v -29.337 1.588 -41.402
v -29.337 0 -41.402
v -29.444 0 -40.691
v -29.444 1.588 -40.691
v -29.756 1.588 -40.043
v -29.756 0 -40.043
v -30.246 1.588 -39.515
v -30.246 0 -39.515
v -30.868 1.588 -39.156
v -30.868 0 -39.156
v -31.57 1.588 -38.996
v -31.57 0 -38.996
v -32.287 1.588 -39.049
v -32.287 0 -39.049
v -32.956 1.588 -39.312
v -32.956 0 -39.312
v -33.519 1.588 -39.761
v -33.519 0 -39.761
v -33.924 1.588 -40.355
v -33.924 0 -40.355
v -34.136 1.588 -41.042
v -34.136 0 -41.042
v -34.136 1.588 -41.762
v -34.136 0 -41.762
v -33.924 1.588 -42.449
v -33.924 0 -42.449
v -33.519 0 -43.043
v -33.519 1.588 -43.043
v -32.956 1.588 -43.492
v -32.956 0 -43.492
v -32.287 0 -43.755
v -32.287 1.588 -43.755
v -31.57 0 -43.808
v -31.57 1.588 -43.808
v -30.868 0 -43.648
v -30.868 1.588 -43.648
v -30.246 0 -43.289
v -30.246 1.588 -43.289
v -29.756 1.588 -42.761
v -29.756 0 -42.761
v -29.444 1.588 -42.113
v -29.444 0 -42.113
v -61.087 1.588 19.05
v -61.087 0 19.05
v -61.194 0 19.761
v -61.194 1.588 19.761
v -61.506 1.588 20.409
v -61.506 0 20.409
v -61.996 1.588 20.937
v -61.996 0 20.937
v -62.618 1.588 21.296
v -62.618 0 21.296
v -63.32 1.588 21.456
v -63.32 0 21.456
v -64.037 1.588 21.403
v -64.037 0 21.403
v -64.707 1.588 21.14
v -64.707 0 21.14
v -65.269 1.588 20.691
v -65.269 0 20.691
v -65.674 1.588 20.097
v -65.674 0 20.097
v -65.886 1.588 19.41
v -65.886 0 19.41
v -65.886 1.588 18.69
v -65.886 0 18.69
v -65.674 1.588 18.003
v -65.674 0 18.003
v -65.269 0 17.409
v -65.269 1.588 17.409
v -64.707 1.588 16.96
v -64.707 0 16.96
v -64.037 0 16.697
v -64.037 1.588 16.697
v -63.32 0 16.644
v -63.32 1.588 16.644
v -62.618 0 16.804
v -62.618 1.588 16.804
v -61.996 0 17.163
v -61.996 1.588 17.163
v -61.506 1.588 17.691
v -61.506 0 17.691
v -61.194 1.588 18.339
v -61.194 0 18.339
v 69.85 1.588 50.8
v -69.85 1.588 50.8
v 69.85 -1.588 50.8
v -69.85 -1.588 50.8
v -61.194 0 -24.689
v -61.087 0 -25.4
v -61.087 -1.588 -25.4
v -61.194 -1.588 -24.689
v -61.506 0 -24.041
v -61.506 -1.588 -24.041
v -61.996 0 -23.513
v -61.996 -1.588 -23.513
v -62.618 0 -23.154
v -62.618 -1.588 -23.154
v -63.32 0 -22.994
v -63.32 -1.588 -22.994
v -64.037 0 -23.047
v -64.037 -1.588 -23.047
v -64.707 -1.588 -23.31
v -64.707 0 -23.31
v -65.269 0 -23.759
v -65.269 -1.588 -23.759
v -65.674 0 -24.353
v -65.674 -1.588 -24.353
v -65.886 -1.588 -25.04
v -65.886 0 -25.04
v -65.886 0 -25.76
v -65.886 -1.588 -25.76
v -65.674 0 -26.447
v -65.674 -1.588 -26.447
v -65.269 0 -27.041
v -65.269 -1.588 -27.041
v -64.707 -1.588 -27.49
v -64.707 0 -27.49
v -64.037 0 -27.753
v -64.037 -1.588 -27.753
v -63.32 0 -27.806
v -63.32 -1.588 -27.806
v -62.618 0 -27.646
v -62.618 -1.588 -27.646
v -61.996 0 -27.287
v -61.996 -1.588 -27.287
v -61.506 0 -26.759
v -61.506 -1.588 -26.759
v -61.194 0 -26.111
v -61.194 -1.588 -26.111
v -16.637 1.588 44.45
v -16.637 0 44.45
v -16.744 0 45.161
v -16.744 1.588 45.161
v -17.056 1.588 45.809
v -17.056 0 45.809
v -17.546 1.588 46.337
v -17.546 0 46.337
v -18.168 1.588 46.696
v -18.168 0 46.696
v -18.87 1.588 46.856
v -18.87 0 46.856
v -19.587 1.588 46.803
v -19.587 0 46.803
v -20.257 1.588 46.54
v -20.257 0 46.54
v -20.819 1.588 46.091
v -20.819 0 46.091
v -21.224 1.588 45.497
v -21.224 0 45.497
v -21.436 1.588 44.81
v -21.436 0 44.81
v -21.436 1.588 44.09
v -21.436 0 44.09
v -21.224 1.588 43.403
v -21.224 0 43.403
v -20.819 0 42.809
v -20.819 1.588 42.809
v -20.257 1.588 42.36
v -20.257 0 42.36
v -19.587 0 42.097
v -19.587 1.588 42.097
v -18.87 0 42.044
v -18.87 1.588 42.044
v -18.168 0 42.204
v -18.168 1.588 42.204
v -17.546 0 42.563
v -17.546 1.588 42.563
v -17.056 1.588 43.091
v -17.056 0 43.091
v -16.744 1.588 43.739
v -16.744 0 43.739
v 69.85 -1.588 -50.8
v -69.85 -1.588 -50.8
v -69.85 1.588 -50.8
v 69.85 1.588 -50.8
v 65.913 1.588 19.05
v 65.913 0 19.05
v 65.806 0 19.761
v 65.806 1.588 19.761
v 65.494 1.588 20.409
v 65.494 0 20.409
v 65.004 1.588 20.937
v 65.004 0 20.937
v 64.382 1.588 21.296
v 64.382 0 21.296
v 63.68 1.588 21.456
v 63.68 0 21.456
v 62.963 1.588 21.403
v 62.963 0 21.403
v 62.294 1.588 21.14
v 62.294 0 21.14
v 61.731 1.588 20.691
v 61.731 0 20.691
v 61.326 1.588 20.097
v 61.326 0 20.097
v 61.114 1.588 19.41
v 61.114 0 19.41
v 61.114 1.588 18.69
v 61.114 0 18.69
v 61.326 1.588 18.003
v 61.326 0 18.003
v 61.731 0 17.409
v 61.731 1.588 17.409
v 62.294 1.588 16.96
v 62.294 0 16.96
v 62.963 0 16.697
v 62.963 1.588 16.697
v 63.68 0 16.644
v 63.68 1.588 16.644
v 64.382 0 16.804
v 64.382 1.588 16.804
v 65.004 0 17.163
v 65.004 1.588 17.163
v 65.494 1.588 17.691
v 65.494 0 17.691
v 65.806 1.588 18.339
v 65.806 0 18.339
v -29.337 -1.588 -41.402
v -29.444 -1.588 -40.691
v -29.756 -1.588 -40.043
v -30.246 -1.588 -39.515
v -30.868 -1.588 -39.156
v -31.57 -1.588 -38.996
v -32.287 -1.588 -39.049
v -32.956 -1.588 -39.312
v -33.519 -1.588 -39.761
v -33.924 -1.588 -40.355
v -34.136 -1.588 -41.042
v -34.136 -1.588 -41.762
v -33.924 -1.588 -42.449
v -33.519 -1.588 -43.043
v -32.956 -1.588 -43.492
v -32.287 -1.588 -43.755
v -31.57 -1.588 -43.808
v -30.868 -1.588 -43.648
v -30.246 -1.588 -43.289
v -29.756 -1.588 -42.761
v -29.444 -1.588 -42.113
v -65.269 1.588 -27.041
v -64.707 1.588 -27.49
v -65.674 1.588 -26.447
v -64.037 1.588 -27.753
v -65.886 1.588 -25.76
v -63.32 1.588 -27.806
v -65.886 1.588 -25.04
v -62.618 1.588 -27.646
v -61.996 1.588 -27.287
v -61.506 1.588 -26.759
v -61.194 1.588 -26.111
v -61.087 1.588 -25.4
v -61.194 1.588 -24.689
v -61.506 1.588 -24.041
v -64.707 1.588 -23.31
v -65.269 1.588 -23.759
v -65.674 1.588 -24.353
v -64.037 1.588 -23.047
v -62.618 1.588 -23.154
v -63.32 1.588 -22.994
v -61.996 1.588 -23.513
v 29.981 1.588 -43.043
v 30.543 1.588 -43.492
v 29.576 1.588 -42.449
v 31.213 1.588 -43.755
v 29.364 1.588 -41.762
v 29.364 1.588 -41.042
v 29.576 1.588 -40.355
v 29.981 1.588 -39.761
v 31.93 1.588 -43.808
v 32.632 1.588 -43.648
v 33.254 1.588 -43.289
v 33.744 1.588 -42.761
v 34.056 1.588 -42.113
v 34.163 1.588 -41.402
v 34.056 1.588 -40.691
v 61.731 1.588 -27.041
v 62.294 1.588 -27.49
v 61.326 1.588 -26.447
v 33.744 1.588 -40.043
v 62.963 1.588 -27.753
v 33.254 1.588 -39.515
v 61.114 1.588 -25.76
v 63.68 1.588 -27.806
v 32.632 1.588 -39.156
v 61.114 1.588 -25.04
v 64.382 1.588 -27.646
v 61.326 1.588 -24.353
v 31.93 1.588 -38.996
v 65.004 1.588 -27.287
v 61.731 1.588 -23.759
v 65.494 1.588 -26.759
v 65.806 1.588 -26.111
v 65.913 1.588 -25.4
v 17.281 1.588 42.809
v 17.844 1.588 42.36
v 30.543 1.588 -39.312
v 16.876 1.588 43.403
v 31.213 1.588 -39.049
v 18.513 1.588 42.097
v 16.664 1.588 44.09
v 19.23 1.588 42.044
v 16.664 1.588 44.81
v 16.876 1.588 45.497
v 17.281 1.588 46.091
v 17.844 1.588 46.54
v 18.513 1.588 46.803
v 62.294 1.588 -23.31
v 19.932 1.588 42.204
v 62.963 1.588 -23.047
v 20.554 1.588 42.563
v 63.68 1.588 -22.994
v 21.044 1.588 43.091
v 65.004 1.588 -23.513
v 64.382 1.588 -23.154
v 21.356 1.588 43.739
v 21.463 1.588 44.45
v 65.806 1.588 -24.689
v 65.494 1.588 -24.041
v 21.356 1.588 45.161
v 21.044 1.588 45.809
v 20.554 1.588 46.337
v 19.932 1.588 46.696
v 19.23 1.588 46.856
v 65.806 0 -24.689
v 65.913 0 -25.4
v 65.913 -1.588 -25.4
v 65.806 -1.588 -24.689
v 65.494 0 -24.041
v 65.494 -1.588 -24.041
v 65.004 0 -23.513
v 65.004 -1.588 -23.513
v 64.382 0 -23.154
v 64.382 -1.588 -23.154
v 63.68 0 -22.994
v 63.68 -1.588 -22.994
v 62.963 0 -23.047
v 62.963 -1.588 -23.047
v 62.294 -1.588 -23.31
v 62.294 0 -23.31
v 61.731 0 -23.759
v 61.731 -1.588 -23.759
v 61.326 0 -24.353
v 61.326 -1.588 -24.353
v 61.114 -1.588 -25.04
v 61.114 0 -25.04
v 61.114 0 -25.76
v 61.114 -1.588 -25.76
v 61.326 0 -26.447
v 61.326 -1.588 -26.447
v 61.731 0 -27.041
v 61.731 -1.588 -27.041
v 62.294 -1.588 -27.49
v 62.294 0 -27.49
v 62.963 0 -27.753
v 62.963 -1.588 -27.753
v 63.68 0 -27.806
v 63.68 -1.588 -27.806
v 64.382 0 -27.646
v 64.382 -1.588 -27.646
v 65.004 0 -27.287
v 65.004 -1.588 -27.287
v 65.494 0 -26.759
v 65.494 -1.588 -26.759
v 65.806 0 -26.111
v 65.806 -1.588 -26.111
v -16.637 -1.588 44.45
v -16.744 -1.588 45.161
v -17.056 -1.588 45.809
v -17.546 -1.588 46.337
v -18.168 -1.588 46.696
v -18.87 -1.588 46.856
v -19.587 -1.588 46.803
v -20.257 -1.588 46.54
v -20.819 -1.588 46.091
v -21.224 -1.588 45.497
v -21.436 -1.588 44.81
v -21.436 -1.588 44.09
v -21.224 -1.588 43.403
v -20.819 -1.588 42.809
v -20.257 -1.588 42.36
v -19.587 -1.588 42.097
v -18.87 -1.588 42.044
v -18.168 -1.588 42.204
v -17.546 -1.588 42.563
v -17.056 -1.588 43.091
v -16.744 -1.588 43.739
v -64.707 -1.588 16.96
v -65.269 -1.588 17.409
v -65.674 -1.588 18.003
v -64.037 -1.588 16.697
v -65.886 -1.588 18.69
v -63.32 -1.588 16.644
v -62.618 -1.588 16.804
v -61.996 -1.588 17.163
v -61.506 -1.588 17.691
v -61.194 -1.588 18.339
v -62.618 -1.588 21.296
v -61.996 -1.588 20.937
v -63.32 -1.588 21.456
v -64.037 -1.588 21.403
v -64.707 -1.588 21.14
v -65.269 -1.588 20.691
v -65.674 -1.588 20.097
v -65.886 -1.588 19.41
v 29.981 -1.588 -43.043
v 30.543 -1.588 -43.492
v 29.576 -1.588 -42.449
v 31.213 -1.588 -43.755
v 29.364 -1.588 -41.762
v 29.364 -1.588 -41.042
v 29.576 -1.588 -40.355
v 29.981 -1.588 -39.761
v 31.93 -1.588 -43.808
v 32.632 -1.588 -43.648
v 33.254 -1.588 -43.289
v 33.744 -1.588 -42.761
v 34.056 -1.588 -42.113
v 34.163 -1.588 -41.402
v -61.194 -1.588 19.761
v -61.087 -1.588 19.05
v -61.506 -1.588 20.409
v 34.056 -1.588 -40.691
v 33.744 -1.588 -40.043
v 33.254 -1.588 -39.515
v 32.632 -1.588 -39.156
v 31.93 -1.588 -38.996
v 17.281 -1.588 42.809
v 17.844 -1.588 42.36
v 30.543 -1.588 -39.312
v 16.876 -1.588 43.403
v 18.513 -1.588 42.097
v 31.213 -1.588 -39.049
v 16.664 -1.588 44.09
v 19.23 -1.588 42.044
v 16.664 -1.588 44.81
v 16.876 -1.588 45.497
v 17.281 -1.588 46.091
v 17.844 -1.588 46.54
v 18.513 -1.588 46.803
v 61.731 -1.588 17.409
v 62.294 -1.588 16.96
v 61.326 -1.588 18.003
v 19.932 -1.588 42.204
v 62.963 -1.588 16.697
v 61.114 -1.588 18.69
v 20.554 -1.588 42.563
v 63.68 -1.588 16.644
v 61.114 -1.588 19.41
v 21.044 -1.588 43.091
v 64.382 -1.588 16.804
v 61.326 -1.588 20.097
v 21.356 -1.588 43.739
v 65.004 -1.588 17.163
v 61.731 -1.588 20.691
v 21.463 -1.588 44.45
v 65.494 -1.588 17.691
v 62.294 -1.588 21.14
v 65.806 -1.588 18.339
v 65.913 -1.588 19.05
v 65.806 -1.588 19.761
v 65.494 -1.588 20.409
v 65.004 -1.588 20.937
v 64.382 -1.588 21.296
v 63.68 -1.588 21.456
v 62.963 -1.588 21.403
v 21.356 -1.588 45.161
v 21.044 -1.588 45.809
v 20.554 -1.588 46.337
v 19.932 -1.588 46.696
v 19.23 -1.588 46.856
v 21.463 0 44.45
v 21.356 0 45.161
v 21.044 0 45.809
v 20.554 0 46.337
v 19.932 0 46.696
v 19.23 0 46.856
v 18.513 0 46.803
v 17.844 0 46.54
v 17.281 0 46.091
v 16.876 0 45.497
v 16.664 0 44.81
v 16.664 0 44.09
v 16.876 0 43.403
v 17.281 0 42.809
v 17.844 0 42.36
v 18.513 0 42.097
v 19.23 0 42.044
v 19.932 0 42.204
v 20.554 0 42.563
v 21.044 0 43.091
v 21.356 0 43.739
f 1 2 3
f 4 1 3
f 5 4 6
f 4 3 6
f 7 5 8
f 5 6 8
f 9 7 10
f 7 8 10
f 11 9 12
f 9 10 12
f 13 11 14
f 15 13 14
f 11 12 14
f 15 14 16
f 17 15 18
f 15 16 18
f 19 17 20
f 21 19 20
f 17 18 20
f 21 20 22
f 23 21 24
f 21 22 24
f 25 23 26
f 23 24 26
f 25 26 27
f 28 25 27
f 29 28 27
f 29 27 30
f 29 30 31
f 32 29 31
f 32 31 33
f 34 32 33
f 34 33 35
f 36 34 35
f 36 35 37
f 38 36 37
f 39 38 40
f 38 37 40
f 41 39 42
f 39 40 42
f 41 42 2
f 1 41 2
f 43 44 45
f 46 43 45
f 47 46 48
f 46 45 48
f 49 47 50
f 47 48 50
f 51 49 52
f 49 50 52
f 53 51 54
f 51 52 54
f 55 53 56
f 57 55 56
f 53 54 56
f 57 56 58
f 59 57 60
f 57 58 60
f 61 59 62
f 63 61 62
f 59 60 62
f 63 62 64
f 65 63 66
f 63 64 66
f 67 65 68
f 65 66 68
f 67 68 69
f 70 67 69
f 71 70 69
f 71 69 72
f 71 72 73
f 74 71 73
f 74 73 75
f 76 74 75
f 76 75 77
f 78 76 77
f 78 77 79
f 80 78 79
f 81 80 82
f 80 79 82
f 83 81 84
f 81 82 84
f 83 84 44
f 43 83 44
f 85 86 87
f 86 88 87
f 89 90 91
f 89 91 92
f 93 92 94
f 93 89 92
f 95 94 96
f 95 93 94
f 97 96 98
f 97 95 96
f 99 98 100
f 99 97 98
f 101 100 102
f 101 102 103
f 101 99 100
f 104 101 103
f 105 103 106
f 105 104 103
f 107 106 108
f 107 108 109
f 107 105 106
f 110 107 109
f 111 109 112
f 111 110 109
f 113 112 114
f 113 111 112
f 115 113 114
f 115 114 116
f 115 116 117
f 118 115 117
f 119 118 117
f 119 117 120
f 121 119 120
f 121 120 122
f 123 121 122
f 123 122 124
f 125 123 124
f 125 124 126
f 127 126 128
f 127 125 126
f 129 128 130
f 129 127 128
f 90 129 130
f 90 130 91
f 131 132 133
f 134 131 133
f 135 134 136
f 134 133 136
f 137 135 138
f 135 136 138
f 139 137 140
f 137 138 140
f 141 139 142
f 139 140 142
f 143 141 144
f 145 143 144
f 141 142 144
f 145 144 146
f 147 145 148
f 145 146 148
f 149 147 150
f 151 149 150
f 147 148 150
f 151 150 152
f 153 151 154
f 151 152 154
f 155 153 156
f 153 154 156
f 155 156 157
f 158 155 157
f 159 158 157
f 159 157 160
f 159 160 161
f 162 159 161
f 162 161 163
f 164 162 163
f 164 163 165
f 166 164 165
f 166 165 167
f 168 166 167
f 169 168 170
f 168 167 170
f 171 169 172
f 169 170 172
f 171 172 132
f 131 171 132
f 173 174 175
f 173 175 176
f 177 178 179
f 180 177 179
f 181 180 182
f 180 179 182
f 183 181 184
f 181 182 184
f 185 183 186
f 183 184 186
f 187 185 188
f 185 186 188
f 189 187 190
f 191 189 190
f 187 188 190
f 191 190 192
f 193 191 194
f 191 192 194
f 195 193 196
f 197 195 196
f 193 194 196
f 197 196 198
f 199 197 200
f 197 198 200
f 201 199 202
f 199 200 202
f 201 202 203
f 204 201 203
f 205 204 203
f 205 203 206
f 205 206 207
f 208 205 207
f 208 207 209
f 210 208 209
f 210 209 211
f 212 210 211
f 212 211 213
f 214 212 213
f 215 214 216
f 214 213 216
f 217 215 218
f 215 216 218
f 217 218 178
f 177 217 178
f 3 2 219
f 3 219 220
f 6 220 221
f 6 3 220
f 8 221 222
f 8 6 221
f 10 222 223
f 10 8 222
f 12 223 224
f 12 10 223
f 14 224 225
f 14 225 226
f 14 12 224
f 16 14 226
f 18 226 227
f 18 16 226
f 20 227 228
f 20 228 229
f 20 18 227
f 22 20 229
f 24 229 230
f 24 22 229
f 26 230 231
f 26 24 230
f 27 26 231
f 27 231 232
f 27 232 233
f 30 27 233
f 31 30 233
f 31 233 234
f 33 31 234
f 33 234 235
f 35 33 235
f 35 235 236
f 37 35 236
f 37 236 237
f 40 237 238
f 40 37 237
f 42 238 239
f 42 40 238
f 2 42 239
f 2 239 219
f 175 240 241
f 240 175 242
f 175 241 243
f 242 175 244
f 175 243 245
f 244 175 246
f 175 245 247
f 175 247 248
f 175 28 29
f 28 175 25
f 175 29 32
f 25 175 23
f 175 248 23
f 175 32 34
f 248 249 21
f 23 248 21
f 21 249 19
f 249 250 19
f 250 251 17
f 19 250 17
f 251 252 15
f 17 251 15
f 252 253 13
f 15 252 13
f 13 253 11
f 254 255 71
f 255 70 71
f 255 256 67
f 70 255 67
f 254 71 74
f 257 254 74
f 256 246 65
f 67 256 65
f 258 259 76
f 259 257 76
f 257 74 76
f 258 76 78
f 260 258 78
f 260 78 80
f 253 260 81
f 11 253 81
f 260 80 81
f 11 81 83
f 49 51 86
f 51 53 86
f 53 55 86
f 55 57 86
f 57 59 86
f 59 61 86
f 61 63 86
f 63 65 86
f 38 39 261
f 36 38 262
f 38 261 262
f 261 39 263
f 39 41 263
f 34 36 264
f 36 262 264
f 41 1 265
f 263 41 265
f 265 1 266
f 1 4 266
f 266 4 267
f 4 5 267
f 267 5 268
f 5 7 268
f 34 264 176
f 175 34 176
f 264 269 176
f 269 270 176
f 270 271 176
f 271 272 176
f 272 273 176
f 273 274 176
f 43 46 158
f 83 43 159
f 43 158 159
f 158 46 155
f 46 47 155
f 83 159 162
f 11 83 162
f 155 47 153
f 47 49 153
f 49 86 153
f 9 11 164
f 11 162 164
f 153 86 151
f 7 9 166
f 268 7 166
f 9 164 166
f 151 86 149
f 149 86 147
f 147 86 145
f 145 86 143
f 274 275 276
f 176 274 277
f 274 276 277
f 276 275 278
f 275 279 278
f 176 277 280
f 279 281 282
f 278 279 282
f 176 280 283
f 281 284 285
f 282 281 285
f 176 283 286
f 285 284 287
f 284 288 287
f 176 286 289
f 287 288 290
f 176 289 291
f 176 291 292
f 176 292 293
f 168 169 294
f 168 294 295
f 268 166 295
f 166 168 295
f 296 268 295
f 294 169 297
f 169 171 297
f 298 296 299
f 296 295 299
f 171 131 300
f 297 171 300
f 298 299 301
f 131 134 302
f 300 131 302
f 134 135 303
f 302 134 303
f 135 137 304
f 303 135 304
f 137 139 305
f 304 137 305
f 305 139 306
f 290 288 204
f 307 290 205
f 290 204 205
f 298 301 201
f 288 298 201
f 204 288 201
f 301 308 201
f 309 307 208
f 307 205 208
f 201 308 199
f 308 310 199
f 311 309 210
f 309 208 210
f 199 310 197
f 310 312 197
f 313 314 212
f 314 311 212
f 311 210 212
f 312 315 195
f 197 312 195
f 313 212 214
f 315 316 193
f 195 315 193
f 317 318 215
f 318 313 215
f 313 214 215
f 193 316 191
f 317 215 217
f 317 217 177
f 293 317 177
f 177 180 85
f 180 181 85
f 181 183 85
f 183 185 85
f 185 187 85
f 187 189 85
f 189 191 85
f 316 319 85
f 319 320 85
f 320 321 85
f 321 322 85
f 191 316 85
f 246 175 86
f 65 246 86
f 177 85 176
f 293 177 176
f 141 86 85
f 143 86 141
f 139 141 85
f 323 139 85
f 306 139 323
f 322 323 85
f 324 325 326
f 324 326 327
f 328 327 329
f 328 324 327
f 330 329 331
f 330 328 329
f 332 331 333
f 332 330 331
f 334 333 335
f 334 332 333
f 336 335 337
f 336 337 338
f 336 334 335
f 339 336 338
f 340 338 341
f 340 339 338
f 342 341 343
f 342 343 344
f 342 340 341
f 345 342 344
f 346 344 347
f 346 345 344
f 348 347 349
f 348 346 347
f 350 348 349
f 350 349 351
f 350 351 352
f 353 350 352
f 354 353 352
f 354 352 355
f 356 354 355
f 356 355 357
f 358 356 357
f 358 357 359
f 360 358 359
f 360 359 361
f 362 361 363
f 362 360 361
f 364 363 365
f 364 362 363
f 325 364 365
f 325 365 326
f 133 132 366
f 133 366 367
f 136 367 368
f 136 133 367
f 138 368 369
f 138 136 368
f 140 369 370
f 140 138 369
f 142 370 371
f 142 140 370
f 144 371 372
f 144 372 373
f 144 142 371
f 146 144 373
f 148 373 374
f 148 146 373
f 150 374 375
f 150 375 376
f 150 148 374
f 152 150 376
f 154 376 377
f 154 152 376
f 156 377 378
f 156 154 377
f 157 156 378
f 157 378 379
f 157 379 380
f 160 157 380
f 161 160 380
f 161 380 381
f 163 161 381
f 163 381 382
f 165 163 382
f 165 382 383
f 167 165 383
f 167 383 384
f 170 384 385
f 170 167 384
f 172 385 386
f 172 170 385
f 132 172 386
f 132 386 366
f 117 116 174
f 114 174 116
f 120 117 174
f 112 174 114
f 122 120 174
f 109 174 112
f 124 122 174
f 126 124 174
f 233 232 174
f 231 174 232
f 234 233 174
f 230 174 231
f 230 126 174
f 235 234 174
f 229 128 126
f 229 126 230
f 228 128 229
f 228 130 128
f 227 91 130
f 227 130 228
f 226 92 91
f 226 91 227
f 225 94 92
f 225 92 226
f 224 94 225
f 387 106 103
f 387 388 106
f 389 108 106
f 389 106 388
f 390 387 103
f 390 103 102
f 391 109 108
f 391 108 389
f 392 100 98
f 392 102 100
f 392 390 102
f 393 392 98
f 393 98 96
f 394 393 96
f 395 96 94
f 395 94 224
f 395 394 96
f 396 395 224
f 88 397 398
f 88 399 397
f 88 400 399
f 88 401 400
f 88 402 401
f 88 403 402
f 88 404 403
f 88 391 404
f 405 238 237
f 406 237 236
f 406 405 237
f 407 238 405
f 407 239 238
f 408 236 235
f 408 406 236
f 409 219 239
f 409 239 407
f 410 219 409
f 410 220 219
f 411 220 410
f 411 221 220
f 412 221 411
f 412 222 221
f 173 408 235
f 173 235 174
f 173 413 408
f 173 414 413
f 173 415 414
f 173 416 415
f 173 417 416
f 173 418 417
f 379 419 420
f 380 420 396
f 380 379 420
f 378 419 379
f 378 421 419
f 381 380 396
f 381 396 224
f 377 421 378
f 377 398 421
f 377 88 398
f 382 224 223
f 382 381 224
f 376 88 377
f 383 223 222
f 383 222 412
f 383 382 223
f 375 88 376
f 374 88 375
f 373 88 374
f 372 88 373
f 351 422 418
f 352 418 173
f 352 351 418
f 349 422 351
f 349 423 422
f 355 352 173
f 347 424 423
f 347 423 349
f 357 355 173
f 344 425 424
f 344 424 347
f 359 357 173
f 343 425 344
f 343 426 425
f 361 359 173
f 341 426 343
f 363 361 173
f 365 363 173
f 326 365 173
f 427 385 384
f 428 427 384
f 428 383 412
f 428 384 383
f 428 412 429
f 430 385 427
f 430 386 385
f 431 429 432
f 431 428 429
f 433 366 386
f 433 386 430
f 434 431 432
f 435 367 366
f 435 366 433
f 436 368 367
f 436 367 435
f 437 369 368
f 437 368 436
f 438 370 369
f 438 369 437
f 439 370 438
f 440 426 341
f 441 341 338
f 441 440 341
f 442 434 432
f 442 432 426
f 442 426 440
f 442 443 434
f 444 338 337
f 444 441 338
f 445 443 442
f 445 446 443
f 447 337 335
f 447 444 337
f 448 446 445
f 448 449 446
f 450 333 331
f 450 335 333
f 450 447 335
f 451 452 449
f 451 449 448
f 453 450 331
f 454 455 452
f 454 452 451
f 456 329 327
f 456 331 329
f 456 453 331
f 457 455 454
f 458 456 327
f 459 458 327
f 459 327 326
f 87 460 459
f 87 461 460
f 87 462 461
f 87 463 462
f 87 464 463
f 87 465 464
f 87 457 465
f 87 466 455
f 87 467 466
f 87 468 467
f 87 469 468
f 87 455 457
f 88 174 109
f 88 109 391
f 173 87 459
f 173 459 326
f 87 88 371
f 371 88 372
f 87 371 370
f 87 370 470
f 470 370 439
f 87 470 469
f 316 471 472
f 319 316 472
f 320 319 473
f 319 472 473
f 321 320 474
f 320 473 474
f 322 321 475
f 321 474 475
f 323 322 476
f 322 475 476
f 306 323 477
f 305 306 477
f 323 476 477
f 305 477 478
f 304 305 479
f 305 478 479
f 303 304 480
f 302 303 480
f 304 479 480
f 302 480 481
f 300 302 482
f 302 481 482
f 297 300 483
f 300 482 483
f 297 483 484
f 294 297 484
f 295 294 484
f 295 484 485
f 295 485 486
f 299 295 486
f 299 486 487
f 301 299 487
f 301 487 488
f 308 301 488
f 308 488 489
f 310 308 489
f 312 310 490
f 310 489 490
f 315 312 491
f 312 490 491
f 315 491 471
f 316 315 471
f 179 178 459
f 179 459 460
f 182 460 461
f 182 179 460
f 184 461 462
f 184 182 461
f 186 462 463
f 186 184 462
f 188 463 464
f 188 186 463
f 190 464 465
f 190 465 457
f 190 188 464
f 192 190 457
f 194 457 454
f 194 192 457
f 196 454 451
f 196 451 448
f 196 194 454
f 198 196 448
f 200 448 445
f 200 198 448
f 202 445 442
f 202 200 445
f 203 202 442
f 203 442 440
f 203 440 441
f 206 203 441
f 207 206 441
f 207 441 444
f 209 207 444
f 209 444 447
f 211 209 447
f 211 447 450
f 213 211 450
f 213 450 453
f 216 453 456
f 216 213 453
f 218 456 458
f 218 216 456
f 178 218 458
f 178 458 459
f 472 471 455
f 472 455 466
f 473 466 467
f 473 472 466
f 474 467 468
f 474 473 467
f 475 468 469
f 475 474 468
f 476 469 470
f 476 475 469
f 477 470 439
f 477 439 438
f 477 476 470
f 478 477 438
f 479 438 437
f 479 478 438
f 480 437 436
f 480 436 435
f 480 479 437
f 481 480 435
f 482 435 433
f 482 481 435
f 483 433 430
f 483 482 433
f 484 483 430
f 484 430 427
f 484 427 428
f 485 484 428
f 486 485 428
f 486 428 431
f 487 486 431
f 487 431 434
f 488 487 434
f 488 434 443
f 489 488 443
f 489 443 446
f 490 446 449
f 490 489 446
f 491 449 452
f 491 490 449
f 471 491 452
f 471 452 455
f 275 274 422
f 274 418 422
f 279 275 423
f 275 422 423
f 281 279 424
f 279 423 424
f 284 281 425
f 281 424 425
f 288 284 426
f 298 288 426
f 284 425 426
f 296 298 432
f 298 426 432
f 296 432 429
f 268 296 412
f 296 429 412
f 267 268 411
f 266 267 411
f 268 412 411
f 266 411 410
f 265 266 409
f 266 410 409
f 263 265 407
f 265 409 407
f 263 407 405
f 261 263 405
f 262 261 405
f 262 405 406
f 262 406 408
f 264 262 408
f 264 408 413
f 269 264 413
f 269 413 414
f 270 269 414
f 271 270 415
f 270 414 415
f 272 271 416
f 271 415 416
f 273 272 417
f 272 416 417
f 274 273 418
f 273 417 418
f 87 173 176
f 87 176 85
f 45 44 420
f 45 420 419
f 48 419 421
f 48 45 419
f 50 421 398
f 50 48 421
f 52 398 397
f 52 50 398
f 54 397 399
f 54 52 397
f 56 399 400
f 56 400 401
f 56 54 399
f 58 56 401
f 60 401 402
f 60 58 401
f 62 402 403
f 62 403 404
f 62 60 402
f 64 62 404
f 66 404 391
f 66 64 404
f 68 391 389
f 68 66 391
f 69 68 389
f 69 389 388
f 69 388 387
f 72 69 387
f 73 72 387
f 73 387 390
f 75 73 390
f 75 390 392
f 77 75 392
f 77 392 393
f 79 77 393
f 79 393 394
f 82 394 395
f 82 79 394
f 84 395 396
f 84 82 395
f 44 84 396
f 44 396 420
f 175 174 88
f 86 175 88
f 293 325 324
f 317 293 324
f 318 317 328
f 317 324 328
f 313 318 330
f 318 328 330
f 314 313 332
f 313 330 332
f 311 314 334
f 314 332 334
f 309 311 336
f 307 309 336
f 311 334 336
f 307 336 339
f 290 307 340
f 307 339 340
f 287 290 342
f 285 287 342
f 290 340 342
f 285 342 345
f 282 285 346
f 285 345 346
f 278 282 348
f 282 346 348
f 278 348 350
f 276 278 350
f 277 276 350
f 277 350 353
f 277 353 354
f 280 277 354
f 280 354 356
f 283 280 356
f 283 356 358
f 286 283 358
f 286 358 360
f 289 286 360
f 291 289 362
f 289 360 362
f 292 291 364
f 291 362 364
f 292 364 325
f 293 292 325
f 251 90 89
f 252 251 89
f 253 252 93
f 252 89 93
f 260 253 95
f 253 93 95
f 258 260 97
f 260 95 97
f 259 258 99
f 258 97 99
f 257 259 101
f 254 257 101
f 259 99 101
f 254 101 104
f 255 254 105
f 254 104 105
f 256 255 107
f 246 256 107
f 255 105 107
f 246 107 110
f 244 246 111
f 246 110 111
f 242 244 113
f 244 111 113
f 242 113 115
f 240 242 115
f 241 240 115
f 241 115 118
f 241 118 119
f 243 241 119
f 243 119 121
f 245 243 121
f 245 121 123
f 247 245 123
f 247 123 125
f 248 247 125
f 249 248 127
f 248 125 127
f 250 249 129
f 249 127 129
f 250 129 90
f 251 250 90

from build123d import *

# Parameters (mm, degrees)
F0_W     = 139.7
F0_H     = 101.6
F1_DEPTH = 1.5875
F2_R     = 2.413
F3_DEPTH = 1.5875


with BuildPart() as f1:
    # F0 (on Front) → F1 (new body, symmetric)
    with BuildSketch(Plane.XZ):
        Rectangle(F0_W, F0_H)
    extrude(amount=F1_DEPTH, both=True)

    # F2 (on Front) → F3 (cut, symmetric)
    with BuildSketch(Plane.XZ):
        with Locations((19.05, 44.45)):
            Circle(F2_R)
        with Locations((-19.05, 44.45)):
            Circle(F2_R)
        with Locations((-63.5, 19.05)):
            Circle(F2_R)
        with Locations((-63.5, -25.4)):
            Circle(F2_R)
        with Locations((63.5, 19.05)):
            Circle(F2_R)
        with Locations((63.5, -25.4)):
            Circle(F2_R)
        with Locations((-31.75, -41.402)):
            Circle(F2_R)
        with Locations((31.75, -41.402)):
            Circle(F2_R)
    extrude(amount=F3_DEPTH, both=True, mode=Mode.SUBTRACT)


solid = f1.part
